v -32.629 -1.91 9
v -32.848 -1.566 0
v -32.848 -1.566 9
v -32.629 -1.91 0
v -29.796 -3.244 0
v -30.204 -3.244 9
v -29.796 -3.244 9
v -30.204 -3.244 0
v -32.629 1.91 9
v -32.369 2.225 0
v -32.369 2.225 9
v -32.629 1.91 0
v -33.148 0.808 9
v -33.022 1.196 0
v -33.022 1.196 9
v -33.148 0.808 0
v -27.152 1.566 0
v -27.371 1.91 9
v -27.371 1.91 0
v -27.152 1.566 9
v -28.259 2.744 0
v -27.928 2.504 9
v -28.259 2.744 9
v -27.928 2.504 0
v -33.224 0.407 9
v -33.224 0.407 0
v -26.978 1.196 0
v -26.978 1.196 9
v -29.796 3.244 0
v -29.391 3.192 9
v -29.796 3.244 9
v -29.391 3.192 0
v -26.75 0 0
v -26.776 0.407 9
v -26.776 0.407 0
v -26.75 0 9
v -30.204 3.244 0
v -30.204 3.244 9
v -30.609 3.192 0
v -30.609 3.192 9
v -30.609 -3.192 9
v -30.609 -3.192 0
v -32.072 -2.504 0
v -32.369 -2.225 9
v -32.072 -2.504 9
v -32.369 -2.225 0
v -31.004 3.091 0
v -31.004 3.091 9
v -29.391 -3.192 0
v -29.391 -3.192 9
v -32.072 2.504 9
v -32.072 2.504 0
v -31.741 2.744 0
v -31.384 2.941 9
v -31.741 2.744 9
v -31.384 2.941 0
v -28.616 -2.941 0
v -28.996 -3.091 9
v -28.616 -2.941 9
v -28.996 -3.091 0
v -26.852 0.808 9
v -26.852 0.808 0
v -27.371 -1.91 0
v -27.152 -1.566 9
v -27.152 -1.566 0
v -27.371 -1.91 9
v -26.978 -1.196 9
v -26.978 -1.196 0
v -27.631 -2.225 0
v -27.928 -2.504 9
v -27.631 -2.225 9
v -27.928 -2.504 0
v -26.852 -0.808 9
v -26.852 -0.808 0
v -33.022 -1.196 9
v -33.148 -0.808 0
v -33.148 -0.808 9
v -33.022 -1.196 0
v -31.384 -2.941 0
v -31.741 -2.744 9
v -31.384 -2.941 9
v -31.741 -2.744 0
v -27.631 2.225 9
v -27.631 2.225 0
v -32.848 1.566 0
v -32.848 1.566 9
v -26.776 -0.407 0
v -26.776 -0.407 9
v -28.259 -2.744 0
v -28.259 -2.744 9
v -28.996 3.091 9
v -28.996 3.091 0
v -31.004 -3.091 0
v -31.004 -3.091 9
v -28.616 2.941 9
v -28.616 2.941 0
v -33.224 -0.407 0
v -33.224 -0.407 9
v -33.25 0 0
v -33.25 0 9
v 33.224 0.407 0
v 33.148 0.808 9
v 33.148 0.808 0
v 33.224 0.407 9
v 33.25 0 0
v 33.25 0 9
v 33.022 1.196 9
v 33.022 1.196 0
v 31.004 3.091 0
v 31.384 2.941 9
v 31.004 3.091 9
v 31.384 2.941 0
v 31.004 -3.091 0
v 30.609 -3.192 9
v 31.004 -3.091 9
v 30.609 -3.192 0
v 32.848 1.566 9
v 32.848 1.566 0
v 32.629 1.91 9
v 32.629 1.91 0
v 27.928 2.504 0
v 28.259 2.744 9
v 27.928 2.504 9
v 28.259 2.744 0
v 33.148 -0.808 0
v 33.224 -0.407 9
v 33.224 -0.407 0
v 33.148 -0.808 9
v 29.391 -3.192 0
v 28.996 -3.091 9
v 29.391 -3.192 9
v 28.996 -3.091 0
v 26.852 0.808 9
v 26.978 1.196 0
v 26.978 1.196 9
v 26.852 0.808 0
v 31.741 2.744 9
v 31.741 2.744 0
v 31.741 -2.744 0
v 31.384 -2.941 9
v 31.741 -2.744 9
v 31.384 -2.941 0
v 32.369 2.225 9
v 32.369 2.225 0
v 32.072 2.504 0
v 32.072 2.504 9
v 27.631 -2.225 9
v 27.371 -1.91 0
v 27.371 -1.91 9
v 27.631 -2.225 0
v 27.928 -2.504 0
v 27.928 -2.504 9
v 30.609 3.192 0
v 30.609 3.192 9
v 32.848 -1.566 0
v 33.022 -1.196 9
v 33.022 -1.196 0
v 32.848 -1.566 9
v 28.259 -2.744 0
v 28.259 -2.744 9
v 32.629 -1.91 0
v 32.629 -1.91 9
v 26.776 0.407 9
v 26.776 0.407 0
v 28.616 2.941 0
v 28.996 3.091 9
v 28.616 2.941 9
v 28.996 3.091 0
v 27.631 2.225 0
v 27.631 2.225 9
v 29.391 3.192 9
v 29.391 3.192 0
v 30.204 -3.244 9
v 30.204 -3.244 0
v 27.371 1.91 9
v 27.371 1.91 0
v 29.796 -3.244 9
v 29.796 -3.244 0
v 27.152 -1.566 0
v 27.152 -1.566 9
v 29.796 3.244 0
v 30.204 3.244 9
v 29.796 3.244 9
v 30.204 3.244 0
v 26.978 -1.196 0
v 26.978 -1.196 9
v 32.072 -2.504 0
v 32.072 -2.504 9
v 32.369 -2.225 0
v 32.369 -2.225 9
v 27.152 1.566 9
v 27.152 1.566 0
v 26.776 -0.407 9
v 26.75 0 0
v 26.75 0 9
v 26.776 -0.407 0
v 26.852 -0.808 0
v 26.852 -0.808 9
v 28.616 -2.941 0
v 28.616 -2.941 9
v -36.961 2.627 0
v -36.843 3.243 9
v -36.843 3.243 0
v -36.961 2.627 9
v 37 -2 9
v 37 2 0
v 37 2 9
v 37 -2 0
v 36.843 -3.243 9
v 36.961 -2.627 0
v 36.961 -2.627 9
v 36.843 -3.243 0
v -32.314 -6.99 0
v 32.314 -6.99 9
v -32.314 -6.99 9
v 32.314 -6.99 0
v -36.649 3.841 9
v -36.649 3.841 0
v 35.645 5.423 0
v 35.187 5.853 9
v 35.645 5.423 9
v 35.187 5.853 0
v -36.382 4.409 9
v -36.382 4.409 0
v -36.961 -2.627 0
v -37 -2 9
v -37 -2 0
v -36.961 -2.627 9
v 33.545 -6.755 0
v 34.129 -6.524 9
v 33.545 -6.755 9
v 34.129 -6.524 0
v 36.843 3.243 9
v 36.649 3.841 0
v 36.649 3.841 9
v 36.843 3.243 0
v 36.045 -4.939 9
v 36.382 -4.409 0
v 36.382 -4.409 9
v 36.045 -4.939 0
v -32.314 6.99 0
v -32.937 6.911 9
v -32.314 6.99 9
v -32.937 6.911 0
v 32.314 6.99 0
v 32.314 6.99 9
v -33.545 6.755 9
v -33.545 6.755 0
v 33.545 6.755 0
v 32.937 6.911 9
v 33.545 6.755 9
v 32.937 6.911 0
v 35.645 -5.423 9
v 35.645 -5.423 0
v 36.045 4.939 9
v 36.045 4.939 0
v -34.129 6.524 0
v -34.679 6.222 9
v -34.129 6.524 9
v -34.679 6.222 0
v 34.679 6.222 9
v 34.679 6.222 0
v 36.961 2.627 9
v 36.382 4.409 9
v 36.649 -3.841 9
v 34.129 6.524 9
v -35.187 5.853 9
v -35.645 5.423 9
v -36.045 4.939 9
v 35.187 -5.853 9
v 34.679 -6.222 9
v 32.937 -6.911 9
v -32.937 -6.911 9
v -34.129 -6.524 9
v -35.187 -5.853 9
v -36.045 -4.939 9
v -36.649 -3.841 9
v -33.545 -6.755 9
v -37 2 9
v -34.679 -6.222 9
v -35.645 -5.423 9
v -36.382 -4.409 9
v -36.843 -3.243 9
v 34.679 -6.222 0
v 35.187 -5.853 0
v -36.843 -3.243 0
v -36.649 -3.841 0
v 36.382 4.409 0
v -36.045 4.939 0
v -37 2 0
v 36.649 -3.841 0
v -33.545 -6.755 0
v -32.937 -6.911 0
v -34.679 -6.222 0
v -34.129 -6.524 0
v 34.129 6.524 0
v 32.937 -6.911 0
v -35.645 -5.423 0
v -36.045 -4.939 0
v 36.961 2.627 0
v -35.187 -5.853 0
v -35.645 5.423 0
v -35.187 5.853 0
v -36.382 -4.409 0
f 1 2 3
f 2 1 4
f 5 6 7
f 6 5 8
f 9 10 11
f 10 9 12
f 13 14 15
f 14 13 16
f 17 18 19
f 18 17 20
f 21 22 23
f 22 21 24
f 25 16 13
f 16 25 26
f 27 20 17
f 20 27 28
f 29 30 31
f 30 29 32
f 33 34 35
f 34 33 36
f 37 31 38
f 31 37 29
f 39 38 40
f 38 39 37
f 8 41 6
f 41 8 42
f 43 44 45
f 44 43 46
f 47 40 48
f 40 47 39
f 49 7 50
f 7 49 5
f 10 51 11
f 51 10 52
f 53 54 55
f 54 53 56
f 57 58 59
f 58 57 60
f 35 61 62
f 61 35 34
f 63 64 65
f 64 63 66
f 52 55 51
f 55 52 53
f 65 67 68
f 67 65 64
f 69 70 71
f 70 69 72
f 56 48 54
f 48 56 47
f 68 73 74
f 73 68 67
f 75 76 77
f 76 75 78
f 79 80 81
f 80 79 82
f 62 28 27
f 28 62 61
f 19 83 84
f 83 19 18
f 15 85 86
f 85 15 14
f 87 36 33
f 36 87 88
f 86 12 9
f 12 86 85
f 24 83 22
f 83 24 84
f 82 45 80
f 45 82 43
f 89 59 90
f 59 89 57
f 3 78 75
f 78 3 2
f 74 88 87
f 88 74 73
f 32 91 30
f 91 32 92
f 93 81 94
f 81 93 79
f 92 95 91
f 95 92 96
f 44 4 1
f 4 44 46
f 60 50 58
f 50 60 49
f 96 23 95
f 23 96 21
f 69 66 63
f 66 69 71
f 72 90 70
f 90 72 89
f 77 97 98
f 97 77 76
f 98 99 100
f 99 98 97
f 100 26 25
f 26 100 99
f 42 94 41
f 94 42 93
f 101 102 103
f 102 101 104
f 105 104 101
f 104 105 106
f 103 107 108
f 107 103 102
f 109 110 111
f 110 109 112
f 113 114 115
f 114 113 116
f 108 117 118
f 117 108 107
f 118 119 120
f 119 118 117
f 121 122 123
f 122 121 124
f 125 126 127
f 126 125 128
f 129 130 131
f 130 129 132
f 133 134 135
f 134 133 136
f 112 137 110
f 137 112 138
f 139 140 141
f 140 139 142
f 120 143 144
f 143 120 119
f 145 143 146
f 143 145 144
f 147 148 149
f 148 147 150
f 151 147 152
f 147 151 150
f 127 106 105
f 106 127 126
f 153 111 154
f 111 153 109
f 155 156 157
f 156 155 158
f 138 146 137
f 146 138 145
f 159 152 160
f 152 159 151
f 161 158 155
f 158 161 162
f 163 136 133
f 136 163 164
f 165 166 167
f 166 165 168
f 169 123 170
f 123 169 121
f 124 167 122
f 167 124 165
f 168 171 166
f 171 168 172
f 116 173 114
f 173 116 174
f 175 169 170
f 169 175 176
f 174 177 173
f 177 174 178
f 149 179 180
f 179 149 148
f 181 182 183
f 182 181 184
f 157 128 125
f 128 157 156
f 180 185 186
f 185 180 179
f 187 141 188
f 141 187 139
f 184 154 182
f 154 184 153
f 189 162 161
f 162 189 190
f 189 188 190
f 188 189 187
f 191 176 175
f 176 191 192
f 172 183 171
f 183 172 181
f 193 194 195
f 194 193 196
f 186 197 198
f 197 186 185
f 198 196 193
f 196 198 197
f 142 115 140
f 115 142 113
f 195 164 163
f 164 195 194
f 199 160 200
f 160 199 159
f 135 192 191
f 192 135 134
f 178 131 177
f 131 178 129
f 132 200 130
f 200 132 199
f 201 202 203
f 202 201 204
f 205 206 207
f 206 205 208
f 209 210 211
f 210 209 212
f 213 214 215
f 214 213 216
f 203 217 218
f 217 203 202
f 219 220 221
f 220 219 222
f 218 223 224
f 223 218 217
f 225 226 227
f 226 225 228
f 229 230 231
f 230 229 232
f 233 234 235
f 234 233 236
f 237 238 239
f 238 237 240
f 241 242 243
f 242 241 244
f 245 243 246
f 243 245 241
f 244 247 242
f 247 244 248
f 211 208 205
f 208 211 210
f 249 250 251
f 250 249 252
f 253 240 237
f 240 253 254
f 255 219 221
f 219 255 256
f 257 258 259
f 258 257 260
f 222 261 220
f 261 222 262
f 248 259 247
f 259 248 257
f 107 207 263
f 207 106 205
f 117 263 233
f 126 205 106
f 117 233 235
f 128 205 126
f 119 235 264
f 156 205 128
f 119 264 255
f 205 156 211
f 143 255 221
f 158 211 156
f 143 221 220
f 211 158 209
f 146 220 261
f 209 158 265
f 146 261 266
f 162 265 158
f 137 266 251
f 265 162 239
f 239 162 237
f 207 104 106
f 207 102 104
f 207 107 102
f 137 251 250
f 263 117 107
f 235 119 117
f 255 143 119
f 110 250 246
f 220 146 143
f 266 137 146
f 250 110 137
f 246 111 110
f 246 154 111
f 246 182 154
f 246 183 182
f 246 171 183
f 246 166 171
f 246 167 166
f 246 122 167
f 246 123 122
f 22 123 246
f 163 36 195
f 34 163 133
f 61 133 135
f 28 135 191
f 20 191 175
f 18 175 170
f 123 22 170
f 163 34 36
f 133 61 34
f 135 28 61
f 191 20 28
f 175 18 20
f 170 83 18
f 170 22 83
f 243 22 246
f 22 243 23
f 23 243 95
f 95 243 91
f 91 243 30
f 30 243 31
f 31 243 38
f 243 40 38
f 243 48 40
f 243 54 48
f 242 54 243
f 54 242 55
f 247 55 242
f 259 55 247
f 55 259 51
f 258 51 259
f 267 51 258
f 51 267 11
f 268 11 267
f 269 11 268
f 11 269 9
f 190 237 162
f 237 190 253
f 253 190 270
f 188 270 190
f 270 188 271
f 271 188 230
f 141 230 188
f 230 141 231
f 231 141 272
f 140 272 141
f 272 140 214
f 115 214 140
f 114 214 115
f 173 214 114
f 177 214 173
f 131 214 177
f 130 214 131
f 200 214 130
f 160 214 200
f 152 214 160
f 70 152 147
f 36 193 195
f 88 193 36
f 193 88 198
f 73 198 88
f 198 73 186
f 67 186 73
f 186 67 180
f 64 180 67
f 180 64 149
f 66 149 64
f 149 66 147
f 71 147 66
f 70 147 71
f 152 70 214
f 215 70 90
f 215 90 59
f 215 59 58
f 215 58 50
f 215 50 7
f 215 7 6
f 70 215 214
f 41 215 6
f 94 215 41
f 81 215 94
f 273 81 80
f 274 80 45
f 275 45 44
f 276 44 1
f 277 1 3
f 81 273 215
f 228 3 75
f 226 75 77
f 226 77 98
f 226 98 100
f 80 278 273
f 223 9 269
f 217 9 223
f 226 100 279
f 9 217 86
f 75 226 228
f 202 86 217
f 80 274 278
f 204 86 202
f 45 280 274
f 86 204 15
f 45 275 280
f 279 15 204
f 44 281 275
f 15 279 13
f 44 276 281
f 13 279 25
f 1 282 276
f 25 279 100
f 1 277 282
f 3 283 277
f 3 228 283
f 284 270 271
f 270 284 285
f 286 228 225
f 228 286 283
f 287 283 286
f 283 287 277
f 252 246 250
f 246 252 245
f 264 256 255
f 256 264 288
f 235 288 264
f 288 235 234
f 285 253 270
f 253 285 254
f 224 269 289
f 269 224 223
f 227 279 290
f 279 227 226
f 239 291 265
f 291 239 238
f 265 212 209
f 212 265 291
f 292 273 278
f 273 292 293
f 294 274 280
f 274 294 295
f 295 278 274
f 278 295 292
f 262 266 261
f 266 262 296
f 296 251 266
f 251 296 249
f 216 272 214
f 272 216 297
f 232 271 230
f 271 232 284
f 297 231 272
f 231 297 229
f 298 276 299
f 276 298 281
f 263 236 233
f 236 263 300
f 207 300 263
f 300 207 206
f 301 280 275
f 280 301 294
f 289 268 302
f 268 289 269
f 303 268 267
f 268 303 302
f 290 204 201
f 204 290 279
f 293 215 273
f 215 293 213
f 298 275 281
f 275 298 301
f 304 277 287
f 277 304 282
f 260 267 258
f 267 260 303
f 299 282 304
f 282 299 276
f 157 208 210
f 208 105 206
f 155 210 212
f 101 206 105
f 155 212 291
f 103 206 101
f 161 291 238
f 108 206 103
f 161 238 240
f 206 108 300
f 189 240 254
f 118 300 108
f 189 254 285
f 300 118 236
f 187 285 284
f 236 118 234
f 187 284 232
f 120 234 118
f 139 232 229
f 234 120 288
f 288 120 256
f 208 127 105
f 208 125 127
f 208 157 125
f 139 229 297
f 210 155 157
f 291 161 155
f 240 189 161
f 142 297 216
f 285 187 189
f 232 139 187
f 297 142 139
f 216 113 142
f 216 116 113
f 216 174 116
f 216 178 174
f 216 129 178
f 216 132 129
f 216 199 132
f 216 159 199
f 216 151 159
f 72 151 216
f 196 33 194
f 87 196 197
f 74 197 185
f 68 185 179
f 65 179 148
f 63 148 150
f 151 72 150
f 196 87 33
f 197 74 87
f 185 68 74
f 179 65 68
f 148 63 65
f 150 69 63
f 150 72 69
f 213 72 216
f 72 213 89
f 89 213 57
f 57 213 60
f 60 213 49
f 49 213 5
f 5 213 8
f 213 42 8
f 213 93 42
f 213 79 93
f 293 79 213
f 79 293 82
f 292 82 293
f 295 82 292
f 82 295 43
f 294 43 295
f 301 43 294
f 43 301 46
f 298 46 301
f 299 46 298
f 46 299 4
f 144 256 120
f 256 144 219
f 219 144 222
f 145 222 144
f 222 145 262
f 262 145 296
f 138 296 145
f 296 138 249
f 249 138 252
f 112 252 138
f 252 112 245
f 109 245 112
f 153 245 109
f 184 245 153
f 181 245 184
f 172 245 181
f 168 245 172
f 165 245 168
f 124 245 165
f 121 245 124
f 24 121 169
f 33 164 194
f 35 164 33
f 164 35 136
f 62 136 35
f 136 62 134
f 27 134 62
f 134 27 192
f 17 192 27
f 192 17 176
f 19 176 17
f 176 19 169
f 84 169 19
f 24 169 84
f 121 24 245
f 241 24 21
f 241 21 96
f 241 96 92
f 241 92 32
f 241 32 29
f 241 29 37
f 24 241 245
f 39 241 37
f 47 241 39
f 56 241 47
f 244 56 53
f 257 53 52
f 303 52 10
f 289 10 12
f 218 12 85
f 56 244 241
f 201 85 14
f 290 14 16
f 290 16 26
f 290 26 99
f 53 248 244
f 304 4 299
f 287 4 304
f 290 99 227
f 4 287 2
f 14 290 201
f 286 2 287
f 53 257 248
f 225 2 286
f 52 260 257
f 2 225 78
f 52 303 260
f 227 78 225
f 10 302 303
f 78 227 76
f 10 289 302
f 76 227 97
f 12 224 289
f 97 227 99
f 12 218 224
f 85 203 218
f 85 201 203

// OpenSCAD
$fn = 50;


difference() {
	union() {
		hull() {
			translate(v = [-32.0000000000, 2.0000000000, 0]) {
				cylinder(h = 9, r = 5);
			}
			translate(v = [32.0000000000, 2.0000000000, 0]) {
				cylinder(h = 9, r = 5);
			}
			translate(v = [-32.0000000000, -2.0000000000, 0]) {
				cylinder(h = 9, r = 5);
			}
			translate(v = [32.0000000000, -2.0000000000, 0]) {
				cylinder(h = 9, r = 5);
			}
		}
	}
	union() {
		translate(v = [-30.0000000000, 0.0000000000, -100.0000000000]) {
			cylinder(h = 200, r = 3.2500000000);
		}
		translate(v = [-30.0000000000, 0.0000000000, -100.0000000000]) {
			cylinder(h = 200, r = 3.2500000000);
		}
		translate(v = [30.0000000000, 0.0000000000, -100.0000000000]) {
			cylinder(h = 200, r = 3.2500000000);
		}
		translate(v = [30.0000000000, 0.0000000000, -100.0000000000]) {
			cylinder(h = 200, r = 3.2500000000);
		}
	}
}
